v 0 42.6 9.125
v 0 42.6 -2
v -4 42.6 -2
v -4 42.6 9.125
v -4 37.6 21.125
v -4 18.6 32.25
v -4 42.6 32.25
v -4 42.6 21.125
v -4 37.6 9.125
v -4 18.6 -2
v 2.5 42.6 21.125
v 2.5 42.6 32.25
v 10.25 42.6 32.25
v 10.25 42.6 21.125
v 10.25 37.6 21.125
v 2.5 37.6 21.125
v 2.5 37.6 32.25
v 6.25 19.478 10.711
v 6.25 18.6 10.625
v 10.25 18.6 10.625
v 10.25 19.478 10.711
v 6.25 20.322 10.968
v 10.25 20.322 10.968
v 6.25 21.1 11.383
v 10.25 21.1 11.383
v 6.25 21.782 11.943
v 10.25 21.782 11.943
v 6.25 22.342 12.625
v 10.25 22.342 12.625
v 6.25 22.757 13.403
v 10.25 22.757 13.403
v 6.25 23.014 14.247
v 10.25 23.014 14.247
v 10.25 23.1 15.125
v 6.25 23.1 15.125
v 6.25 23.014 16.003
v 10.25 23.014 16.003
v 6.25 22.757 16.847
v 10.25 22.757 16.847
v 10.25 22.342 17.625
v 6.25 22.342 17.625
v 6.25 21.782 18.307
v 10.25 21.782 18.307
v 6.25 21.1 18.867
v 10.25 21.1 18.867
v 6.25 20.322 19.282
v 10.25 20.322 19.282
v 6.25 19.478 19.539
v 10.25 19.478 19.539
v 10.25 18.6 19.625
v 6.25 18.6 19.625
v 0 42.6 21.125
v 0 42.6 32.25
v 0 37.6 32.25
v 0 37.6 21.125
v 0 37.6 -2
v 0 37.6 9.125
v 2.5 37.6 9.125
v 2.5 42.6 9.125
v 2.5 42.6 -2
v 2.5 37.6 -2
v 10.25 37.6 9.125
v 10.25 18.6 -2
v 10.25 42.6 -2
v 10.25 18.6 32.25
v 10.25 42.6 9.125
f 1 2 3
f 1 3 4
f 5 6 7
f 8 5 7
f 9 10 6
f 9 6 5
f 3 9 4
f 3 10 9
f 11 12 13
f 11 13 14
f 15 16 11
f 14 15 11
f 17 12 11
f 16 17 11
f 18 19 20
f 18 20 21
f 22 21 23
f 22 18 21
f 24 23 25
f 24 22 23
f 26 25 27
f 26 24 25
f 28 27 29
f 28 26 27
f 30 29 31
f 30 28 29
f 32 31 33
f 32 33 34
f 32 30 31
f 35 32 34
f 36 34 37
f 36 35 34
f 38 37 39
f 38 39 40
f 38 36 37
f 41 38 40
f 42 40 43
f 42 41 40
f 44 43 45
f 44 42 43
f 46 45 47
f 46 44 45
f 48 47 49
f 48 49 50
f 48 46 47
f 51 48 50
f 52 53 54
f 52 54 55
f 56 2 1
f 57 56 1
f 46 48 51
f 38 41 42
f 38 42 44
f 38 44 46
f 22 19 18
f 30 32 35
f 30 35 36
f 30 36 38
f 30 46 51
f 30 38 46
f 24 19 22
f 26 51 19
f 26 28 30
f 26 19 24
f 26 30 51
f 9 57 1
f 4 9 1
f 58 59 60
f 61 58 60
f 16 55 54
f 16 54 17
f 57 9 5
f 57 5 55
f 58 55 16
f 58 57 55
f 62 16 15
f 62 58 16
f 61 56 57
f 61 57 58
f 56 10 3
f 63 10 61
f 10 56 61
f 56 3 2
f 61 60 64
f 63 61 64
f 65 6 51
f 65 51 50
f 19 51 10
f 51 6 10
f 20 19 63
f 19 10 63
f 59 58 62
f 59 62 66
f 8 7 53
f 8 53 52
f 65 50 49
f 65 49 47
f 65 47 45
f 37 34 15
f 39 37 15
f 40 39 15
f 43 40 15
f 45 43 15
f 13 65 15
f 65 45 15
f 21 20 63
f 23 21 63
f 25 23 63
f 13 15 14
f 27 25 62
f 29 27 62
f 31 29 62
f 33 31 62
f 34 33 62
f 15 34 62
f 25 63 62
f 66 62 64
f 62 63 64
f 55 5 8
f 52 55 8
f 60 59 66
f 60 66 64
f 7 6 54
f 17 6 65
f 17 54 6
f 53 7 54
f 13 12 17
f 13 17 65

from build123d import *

# Parameters (mm, degrees)
CYLINDER020_R     = 4.5
CYLINDER020_DEPTH = 4
BOX014_W          = 11.125
BOX014_H          = 6
BOX014_DEPTH      = 4
BOX015_W          = 11.125
BOX015_H          = 6
BOX015_DEPTH      = 4
BOX021_W          = 11.125
BOX021_H          = 6
BOX021_DEPTH      = 7.75
BOX003_W          = 14.25
BOX003_H          = 19
BOX003_DEPTH      = 34.25
BOX022_W          = 11.125
BOX022_H          = 6
BOX022_DEPTH      = 7.75


with BuildPart() as cylinder020:
    # Cylinder020 → Cylinder020 (new body)
    with BuildSketch(Plane(origin=(6.25, 18.6, 15.125), x_dir=(0, 0, -1), z_dir=(1, 0, 0))):
        Circle(CYLINDER020_R)
    extrude(amount=CYLINDER020_DEPTH)


with BuildPart() as base_holder:
    # Box014 → Box014 (new body)
    with BuildSketch(Plane(origin=(0, 36.6, -2), x_dir=(0, 0, 1), z_dir=(-1, 0, 0))):
        with Locations((5.5625, 3)):
            Rectangle(BOX014_W, BOX014_H)
    extrude(amount=BOX014_DEPTH)


with BuildPart() as base_holder001:
    # Box015 → Box015 (new body)
    with BuildSketch(Plane(origin=(-4, 36.6, 32.25), x_dir=(0, 0, -1), z_dir=(1, 0, 0))):
        with Locations((5.5625, 3)):
            Rectangle(BOX015_W, BOX015_H)
    extrude(amount=BOX015_DEPTH)


with BuildPart() as base_holder002:
    # Box021 → Box021 (new body)
    with BuildSketch(Plane(origin=(2.5, 36.6, 32.25), x_dir=(0, 0, -1), z_dir=(1, 0, 0))):
        with Locations((5.5625, 3)):
            Rectangle(BOX021_W, BOX021_H)
    extrude(amount=BOX021_DEPTH)


with BuildPart() as f_3d_print_syringe_holder:
    # Box003 → Box003 (new body)
    with BuildSketch(Plane(origin=(-4, 18.6, -2), x_dir=(1, 0, 0), z_dir=(0, 0, 1))):
        with Locations((7.125, 9.5)):
            Rectangle(BOX003_W, BOX003_H)
    extrude(amount=BOX003_DEPTH)


with BuildPart() as cut007:
    # Box022 → Box022 (new body)
    with BuildSketch(Plane(origin=(2.5, 36.6, 9.125), x_dir=(0, 0, -1), z_dir=(1, 0, 0))):
        with Locations((5.5625, 3)):
            Rectangle(BOX022_W, BOX022_H)
    extrude(amount=BOX022_DEPTH)

    # Fusion010: union base_holder, base_holder001, base_holder002, 3D_print_syringe_holder
    add(base_holder.part)
    add(base_holder001.part)
    add(base_holder002.part)
    add(f_3d_print_syringe_holder.part)

    # Cut007: cut Cylinder020
    add(cylinder020.part, mode=Mode.SUBTRACT)


solid = cut007.part
